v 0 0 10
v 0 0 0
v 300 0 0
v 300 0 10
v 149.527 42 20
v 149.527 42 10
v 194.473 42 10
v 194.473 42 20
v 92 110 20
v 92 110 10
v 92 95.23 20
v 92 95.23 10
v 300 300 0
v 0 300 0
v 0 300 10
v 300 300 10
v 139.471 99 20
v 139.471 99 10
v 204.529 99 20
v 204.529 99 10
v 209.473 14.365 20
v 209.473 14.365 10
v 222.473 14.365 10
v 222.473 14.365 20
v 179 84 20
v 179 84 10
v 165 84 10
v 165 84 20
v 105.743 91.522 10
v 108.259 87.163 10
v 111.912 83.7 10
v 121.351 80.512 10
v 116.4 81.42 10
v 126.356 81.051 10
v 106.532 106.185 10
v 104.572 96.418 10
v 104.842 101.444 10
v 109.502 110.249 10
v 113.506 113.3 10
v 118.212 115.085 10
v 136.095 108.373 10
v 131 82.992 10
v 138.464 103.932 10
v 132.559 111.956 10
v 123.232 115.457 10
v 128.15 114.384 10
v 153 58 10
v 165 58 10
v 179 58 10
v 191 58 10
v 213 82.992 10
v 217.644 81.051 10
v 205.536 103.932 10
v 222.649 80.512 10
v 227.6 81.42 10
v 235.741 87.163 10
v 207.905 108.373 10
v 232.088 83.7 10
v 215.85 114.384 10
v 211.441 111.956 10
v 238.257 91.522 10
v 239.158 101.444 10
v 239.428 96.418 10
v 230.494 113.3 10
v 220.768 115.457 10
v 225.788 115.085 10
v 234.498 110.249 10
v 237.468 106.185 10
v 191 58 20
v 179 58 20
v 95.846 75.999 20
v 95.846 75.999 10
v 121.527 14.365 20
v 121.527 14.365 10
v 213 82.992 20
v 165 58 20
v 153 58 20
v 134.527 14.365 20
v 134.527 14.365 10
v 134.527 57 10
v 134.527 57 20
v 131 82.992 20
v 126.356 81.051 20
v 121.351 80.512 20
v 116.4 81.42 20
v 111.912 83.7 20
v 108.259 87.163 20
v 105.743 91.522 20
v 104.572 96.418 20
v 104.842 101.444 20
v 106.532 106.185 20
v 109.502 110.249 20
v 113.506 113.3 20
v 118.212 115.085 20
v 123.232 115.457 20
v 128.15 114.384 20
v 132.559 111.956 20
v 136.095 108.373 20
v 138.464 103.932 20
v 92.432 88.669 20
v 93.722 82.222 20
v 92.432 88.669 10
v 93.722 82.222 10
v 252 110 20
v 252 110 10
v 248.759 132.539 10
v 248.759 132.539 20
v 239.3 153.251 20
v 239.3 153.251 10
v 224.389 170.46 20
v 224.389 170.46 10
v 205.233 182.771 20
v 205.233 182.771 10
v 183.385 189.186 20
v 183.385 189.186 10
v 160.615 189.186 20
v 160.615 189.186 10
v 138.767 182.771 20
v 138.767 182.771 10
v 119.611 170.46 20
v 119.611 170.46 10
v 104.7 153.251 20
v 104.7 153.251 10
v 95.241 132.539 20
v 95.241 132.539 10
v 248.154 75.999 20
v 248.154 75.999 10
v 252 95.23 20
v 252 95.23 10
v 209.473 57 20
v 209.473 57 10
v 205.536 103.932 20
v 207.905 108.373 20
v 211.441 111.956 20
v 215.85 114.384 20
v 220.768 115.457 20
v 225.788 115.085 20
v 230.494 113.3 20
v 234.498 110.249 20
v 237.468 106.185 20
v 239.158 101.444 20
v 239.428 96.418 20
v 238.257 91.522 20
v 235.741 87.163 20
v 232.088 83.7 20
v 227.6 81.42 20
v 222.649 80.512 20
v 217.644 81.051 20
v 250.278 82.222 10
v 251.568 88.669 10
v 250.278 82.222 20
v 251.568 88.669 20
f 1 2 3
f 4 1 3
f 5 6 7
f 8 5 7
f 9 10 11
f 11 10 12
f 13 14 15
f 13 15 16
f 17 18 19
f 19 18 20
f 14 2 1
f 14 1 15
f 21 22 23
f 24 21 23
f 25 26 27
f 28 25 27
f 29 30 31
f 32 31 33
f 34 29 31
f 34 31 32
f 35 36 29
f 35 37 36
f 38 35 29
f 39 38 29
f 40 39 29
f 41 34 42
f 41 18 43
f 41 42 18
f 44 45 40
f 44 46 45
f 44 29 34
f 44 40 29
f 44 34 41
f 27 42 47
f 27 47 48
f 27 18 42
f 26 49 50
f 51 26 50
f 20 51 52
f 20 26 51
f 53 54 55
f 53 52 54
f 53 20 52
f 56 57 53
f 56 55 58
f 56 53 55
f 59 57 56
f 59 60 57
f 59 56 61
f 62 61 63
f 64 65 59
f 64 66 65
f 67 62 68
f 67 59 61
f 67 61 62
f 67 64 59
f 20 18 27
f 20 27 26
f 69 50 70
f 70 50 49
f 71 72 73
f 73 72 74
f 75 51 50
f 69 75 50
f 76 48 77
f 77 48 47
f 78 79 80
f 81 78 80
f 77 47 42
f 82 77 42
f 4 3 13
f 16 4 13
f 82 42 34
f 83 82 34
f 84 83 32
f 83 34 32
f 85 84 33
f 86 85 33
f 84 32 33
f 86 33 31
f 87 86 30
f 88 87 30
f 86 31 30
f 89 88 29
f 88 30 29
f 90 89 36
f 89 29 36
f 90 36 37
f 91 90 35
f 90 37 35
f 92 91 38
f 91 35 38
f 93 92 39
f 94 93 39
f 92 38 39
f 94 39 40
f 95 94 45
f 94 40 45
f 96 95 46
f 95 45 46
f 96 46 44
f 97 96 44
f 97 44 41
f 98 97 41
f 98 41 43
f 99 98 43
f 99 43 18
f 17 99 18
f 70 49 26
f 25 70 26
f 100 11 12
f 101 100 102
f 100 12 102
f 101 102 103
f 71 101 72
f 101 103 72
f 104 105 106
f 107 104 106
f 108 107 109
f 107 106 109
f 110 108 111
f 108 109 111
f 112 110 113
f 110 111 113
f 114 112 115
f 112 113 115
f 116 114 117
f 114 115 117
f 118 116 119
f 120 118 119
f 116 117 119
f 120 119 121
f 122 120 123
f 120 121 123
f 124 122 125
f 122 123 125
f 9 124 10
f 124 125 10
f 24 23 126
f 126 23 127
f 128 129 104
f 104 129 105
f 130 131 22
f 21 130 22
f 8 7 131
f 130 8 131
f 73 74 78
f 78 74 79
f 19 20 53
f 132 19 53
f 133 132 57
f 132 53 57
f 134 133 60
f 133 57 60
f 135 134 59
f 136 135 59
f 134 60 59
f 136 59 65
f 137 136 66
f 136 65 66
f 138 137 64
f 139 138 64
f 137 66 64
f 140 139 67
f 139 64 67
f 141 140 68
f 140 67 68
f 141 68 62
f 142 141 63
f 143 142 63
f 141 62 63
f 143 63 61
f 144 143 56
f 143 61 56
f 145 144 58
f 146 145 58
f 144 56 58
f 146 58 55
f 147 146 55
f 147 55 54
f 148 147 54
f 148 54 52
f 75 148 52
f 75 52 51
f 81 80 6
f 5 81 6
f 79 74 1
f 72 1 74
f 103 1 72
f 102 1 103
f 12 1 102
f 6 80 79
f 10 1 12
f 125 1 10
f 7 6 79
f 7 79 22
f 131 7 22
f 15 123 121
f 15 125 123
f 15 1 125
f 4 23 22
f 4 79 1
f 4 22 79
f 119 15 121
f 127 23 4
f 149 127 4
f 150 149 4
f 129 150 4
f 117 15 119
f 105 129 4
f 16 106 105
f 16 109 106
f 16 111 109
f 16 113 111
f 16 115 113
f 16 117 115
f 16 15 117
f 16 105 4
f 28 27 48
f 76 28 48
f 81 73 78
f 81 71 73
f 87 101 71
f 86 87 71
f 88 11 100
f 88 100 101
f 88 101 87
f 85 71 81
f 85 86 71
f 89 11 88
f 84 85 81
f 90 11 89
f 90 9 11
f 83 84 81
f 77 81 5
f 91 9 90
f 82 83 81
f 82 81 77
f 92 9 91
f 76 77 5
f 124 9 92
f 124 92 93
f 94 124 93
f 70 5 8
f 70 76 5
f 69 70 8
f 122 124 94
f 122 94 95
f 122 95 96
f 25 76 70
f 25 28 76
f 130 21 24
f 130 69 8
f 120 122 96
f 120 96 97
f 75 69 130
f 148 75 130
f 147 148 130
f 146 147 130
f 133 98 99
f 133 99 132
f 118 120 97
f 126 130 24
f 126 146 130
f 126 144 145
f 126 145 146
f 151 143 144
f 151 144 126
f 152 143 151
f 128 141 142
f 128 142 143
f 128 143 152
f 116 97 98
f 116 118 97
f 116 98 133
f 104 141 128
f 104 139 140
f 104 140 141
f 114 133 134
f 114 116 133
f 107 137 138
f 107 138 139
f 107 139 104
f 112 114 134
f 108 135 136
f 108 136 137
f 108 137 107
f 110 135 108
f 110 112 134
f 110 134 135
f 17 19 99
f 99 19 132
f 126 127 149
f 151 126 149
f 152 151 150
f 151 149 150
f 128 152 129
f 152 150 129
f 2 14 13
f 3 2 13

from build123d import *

# Parameters (mm, degrees)
SKICA1_W                = 300
SKICA1_H                = 300
P_IDAT_VYSUNUT_M1_DEPTH = 10
P_IDAT_VYSUNUT_M3_DEPTH = 10


with BuildPart() as part:
    # Skica1 → Přidat vysunutím1 (new body)
    with BuildSketch(Plane.XY):
        with Locations((150, 150)):
            Rectangle(SKICA1_W, SKICA1_H)
    extrude(amount=P_IDAT_VYSUNUT_M1_DEPTH)

    # Skica3 → Přidat vysunutím3 (add)
    with BuildSketch(Plane.XY.offset(10)):
        with BuildLine():
            Line((121.527137935, 14.364823185), (134.527137935, 14.364823185))
            Line((134.527137935, 14.364823185), (134.527137935, 57))
            Line((134.527137935, 57), (149.527137935, 42))
            Line((149.527137935, 42), (194.472862065, 42))
            Line((194.472862065, 42), (209.472862065, 57))
            Line((209.472862065, 57), (209.472862065, 14.364823185))
            Line((209.472862065, 14.364823185), (222.472862065, 14.364823185))
            Line((222.472862065, 14.364823185), (248.153836395, 75.999073478))
            ThreePointArc((248.153836395, 75.999073478), (251.029031296, 85.424046933), (252, 95.22986613))
            Line((252, 95.22986613), (252, 110))
            ThreePointArc((252, 110), (172, 190), (92, 110))
            Line((92, 110), (92, 95.22986613))
            ThreePointArc((92, 95.22986613), (92.970968704, 85.424046933), (95.846163605, 75.999073478))
            Line((95.846163605, 75.999073478), (121.527137935, 14.364823185))
        make_face()
        with BuildLine():
            ThreePointArc((131, 82.99166898), (106.532275896, 106.185322904), (139.47140521, 99))
            Line((139.47140521, 99), (204.52859479, 99))
            ThreePointArc((204.52859479, 99), (222.500204374, 115.492849842), (239.5, 98))
            ThreePointArc((239.5, 98), (230.624094155, 82.772557667), (213, 82.99166898))
            Line((213, 82.99166898), (191, 58))
            Line((191, 58), (179, 58))
            Line((179, 58), (179, 84))
            Line((179, 84), (165, 84))
            Line((165, 84), (165, 58))
            Line((165, 58), (153, 58))
            Line((153, 58), (131, 82.99166898))
        make_face(mode=Mode.SUBTRACT)
    extrude(amount=P_IDAT_VYSUNUT_M3_DEPTH)


solid = part.part
